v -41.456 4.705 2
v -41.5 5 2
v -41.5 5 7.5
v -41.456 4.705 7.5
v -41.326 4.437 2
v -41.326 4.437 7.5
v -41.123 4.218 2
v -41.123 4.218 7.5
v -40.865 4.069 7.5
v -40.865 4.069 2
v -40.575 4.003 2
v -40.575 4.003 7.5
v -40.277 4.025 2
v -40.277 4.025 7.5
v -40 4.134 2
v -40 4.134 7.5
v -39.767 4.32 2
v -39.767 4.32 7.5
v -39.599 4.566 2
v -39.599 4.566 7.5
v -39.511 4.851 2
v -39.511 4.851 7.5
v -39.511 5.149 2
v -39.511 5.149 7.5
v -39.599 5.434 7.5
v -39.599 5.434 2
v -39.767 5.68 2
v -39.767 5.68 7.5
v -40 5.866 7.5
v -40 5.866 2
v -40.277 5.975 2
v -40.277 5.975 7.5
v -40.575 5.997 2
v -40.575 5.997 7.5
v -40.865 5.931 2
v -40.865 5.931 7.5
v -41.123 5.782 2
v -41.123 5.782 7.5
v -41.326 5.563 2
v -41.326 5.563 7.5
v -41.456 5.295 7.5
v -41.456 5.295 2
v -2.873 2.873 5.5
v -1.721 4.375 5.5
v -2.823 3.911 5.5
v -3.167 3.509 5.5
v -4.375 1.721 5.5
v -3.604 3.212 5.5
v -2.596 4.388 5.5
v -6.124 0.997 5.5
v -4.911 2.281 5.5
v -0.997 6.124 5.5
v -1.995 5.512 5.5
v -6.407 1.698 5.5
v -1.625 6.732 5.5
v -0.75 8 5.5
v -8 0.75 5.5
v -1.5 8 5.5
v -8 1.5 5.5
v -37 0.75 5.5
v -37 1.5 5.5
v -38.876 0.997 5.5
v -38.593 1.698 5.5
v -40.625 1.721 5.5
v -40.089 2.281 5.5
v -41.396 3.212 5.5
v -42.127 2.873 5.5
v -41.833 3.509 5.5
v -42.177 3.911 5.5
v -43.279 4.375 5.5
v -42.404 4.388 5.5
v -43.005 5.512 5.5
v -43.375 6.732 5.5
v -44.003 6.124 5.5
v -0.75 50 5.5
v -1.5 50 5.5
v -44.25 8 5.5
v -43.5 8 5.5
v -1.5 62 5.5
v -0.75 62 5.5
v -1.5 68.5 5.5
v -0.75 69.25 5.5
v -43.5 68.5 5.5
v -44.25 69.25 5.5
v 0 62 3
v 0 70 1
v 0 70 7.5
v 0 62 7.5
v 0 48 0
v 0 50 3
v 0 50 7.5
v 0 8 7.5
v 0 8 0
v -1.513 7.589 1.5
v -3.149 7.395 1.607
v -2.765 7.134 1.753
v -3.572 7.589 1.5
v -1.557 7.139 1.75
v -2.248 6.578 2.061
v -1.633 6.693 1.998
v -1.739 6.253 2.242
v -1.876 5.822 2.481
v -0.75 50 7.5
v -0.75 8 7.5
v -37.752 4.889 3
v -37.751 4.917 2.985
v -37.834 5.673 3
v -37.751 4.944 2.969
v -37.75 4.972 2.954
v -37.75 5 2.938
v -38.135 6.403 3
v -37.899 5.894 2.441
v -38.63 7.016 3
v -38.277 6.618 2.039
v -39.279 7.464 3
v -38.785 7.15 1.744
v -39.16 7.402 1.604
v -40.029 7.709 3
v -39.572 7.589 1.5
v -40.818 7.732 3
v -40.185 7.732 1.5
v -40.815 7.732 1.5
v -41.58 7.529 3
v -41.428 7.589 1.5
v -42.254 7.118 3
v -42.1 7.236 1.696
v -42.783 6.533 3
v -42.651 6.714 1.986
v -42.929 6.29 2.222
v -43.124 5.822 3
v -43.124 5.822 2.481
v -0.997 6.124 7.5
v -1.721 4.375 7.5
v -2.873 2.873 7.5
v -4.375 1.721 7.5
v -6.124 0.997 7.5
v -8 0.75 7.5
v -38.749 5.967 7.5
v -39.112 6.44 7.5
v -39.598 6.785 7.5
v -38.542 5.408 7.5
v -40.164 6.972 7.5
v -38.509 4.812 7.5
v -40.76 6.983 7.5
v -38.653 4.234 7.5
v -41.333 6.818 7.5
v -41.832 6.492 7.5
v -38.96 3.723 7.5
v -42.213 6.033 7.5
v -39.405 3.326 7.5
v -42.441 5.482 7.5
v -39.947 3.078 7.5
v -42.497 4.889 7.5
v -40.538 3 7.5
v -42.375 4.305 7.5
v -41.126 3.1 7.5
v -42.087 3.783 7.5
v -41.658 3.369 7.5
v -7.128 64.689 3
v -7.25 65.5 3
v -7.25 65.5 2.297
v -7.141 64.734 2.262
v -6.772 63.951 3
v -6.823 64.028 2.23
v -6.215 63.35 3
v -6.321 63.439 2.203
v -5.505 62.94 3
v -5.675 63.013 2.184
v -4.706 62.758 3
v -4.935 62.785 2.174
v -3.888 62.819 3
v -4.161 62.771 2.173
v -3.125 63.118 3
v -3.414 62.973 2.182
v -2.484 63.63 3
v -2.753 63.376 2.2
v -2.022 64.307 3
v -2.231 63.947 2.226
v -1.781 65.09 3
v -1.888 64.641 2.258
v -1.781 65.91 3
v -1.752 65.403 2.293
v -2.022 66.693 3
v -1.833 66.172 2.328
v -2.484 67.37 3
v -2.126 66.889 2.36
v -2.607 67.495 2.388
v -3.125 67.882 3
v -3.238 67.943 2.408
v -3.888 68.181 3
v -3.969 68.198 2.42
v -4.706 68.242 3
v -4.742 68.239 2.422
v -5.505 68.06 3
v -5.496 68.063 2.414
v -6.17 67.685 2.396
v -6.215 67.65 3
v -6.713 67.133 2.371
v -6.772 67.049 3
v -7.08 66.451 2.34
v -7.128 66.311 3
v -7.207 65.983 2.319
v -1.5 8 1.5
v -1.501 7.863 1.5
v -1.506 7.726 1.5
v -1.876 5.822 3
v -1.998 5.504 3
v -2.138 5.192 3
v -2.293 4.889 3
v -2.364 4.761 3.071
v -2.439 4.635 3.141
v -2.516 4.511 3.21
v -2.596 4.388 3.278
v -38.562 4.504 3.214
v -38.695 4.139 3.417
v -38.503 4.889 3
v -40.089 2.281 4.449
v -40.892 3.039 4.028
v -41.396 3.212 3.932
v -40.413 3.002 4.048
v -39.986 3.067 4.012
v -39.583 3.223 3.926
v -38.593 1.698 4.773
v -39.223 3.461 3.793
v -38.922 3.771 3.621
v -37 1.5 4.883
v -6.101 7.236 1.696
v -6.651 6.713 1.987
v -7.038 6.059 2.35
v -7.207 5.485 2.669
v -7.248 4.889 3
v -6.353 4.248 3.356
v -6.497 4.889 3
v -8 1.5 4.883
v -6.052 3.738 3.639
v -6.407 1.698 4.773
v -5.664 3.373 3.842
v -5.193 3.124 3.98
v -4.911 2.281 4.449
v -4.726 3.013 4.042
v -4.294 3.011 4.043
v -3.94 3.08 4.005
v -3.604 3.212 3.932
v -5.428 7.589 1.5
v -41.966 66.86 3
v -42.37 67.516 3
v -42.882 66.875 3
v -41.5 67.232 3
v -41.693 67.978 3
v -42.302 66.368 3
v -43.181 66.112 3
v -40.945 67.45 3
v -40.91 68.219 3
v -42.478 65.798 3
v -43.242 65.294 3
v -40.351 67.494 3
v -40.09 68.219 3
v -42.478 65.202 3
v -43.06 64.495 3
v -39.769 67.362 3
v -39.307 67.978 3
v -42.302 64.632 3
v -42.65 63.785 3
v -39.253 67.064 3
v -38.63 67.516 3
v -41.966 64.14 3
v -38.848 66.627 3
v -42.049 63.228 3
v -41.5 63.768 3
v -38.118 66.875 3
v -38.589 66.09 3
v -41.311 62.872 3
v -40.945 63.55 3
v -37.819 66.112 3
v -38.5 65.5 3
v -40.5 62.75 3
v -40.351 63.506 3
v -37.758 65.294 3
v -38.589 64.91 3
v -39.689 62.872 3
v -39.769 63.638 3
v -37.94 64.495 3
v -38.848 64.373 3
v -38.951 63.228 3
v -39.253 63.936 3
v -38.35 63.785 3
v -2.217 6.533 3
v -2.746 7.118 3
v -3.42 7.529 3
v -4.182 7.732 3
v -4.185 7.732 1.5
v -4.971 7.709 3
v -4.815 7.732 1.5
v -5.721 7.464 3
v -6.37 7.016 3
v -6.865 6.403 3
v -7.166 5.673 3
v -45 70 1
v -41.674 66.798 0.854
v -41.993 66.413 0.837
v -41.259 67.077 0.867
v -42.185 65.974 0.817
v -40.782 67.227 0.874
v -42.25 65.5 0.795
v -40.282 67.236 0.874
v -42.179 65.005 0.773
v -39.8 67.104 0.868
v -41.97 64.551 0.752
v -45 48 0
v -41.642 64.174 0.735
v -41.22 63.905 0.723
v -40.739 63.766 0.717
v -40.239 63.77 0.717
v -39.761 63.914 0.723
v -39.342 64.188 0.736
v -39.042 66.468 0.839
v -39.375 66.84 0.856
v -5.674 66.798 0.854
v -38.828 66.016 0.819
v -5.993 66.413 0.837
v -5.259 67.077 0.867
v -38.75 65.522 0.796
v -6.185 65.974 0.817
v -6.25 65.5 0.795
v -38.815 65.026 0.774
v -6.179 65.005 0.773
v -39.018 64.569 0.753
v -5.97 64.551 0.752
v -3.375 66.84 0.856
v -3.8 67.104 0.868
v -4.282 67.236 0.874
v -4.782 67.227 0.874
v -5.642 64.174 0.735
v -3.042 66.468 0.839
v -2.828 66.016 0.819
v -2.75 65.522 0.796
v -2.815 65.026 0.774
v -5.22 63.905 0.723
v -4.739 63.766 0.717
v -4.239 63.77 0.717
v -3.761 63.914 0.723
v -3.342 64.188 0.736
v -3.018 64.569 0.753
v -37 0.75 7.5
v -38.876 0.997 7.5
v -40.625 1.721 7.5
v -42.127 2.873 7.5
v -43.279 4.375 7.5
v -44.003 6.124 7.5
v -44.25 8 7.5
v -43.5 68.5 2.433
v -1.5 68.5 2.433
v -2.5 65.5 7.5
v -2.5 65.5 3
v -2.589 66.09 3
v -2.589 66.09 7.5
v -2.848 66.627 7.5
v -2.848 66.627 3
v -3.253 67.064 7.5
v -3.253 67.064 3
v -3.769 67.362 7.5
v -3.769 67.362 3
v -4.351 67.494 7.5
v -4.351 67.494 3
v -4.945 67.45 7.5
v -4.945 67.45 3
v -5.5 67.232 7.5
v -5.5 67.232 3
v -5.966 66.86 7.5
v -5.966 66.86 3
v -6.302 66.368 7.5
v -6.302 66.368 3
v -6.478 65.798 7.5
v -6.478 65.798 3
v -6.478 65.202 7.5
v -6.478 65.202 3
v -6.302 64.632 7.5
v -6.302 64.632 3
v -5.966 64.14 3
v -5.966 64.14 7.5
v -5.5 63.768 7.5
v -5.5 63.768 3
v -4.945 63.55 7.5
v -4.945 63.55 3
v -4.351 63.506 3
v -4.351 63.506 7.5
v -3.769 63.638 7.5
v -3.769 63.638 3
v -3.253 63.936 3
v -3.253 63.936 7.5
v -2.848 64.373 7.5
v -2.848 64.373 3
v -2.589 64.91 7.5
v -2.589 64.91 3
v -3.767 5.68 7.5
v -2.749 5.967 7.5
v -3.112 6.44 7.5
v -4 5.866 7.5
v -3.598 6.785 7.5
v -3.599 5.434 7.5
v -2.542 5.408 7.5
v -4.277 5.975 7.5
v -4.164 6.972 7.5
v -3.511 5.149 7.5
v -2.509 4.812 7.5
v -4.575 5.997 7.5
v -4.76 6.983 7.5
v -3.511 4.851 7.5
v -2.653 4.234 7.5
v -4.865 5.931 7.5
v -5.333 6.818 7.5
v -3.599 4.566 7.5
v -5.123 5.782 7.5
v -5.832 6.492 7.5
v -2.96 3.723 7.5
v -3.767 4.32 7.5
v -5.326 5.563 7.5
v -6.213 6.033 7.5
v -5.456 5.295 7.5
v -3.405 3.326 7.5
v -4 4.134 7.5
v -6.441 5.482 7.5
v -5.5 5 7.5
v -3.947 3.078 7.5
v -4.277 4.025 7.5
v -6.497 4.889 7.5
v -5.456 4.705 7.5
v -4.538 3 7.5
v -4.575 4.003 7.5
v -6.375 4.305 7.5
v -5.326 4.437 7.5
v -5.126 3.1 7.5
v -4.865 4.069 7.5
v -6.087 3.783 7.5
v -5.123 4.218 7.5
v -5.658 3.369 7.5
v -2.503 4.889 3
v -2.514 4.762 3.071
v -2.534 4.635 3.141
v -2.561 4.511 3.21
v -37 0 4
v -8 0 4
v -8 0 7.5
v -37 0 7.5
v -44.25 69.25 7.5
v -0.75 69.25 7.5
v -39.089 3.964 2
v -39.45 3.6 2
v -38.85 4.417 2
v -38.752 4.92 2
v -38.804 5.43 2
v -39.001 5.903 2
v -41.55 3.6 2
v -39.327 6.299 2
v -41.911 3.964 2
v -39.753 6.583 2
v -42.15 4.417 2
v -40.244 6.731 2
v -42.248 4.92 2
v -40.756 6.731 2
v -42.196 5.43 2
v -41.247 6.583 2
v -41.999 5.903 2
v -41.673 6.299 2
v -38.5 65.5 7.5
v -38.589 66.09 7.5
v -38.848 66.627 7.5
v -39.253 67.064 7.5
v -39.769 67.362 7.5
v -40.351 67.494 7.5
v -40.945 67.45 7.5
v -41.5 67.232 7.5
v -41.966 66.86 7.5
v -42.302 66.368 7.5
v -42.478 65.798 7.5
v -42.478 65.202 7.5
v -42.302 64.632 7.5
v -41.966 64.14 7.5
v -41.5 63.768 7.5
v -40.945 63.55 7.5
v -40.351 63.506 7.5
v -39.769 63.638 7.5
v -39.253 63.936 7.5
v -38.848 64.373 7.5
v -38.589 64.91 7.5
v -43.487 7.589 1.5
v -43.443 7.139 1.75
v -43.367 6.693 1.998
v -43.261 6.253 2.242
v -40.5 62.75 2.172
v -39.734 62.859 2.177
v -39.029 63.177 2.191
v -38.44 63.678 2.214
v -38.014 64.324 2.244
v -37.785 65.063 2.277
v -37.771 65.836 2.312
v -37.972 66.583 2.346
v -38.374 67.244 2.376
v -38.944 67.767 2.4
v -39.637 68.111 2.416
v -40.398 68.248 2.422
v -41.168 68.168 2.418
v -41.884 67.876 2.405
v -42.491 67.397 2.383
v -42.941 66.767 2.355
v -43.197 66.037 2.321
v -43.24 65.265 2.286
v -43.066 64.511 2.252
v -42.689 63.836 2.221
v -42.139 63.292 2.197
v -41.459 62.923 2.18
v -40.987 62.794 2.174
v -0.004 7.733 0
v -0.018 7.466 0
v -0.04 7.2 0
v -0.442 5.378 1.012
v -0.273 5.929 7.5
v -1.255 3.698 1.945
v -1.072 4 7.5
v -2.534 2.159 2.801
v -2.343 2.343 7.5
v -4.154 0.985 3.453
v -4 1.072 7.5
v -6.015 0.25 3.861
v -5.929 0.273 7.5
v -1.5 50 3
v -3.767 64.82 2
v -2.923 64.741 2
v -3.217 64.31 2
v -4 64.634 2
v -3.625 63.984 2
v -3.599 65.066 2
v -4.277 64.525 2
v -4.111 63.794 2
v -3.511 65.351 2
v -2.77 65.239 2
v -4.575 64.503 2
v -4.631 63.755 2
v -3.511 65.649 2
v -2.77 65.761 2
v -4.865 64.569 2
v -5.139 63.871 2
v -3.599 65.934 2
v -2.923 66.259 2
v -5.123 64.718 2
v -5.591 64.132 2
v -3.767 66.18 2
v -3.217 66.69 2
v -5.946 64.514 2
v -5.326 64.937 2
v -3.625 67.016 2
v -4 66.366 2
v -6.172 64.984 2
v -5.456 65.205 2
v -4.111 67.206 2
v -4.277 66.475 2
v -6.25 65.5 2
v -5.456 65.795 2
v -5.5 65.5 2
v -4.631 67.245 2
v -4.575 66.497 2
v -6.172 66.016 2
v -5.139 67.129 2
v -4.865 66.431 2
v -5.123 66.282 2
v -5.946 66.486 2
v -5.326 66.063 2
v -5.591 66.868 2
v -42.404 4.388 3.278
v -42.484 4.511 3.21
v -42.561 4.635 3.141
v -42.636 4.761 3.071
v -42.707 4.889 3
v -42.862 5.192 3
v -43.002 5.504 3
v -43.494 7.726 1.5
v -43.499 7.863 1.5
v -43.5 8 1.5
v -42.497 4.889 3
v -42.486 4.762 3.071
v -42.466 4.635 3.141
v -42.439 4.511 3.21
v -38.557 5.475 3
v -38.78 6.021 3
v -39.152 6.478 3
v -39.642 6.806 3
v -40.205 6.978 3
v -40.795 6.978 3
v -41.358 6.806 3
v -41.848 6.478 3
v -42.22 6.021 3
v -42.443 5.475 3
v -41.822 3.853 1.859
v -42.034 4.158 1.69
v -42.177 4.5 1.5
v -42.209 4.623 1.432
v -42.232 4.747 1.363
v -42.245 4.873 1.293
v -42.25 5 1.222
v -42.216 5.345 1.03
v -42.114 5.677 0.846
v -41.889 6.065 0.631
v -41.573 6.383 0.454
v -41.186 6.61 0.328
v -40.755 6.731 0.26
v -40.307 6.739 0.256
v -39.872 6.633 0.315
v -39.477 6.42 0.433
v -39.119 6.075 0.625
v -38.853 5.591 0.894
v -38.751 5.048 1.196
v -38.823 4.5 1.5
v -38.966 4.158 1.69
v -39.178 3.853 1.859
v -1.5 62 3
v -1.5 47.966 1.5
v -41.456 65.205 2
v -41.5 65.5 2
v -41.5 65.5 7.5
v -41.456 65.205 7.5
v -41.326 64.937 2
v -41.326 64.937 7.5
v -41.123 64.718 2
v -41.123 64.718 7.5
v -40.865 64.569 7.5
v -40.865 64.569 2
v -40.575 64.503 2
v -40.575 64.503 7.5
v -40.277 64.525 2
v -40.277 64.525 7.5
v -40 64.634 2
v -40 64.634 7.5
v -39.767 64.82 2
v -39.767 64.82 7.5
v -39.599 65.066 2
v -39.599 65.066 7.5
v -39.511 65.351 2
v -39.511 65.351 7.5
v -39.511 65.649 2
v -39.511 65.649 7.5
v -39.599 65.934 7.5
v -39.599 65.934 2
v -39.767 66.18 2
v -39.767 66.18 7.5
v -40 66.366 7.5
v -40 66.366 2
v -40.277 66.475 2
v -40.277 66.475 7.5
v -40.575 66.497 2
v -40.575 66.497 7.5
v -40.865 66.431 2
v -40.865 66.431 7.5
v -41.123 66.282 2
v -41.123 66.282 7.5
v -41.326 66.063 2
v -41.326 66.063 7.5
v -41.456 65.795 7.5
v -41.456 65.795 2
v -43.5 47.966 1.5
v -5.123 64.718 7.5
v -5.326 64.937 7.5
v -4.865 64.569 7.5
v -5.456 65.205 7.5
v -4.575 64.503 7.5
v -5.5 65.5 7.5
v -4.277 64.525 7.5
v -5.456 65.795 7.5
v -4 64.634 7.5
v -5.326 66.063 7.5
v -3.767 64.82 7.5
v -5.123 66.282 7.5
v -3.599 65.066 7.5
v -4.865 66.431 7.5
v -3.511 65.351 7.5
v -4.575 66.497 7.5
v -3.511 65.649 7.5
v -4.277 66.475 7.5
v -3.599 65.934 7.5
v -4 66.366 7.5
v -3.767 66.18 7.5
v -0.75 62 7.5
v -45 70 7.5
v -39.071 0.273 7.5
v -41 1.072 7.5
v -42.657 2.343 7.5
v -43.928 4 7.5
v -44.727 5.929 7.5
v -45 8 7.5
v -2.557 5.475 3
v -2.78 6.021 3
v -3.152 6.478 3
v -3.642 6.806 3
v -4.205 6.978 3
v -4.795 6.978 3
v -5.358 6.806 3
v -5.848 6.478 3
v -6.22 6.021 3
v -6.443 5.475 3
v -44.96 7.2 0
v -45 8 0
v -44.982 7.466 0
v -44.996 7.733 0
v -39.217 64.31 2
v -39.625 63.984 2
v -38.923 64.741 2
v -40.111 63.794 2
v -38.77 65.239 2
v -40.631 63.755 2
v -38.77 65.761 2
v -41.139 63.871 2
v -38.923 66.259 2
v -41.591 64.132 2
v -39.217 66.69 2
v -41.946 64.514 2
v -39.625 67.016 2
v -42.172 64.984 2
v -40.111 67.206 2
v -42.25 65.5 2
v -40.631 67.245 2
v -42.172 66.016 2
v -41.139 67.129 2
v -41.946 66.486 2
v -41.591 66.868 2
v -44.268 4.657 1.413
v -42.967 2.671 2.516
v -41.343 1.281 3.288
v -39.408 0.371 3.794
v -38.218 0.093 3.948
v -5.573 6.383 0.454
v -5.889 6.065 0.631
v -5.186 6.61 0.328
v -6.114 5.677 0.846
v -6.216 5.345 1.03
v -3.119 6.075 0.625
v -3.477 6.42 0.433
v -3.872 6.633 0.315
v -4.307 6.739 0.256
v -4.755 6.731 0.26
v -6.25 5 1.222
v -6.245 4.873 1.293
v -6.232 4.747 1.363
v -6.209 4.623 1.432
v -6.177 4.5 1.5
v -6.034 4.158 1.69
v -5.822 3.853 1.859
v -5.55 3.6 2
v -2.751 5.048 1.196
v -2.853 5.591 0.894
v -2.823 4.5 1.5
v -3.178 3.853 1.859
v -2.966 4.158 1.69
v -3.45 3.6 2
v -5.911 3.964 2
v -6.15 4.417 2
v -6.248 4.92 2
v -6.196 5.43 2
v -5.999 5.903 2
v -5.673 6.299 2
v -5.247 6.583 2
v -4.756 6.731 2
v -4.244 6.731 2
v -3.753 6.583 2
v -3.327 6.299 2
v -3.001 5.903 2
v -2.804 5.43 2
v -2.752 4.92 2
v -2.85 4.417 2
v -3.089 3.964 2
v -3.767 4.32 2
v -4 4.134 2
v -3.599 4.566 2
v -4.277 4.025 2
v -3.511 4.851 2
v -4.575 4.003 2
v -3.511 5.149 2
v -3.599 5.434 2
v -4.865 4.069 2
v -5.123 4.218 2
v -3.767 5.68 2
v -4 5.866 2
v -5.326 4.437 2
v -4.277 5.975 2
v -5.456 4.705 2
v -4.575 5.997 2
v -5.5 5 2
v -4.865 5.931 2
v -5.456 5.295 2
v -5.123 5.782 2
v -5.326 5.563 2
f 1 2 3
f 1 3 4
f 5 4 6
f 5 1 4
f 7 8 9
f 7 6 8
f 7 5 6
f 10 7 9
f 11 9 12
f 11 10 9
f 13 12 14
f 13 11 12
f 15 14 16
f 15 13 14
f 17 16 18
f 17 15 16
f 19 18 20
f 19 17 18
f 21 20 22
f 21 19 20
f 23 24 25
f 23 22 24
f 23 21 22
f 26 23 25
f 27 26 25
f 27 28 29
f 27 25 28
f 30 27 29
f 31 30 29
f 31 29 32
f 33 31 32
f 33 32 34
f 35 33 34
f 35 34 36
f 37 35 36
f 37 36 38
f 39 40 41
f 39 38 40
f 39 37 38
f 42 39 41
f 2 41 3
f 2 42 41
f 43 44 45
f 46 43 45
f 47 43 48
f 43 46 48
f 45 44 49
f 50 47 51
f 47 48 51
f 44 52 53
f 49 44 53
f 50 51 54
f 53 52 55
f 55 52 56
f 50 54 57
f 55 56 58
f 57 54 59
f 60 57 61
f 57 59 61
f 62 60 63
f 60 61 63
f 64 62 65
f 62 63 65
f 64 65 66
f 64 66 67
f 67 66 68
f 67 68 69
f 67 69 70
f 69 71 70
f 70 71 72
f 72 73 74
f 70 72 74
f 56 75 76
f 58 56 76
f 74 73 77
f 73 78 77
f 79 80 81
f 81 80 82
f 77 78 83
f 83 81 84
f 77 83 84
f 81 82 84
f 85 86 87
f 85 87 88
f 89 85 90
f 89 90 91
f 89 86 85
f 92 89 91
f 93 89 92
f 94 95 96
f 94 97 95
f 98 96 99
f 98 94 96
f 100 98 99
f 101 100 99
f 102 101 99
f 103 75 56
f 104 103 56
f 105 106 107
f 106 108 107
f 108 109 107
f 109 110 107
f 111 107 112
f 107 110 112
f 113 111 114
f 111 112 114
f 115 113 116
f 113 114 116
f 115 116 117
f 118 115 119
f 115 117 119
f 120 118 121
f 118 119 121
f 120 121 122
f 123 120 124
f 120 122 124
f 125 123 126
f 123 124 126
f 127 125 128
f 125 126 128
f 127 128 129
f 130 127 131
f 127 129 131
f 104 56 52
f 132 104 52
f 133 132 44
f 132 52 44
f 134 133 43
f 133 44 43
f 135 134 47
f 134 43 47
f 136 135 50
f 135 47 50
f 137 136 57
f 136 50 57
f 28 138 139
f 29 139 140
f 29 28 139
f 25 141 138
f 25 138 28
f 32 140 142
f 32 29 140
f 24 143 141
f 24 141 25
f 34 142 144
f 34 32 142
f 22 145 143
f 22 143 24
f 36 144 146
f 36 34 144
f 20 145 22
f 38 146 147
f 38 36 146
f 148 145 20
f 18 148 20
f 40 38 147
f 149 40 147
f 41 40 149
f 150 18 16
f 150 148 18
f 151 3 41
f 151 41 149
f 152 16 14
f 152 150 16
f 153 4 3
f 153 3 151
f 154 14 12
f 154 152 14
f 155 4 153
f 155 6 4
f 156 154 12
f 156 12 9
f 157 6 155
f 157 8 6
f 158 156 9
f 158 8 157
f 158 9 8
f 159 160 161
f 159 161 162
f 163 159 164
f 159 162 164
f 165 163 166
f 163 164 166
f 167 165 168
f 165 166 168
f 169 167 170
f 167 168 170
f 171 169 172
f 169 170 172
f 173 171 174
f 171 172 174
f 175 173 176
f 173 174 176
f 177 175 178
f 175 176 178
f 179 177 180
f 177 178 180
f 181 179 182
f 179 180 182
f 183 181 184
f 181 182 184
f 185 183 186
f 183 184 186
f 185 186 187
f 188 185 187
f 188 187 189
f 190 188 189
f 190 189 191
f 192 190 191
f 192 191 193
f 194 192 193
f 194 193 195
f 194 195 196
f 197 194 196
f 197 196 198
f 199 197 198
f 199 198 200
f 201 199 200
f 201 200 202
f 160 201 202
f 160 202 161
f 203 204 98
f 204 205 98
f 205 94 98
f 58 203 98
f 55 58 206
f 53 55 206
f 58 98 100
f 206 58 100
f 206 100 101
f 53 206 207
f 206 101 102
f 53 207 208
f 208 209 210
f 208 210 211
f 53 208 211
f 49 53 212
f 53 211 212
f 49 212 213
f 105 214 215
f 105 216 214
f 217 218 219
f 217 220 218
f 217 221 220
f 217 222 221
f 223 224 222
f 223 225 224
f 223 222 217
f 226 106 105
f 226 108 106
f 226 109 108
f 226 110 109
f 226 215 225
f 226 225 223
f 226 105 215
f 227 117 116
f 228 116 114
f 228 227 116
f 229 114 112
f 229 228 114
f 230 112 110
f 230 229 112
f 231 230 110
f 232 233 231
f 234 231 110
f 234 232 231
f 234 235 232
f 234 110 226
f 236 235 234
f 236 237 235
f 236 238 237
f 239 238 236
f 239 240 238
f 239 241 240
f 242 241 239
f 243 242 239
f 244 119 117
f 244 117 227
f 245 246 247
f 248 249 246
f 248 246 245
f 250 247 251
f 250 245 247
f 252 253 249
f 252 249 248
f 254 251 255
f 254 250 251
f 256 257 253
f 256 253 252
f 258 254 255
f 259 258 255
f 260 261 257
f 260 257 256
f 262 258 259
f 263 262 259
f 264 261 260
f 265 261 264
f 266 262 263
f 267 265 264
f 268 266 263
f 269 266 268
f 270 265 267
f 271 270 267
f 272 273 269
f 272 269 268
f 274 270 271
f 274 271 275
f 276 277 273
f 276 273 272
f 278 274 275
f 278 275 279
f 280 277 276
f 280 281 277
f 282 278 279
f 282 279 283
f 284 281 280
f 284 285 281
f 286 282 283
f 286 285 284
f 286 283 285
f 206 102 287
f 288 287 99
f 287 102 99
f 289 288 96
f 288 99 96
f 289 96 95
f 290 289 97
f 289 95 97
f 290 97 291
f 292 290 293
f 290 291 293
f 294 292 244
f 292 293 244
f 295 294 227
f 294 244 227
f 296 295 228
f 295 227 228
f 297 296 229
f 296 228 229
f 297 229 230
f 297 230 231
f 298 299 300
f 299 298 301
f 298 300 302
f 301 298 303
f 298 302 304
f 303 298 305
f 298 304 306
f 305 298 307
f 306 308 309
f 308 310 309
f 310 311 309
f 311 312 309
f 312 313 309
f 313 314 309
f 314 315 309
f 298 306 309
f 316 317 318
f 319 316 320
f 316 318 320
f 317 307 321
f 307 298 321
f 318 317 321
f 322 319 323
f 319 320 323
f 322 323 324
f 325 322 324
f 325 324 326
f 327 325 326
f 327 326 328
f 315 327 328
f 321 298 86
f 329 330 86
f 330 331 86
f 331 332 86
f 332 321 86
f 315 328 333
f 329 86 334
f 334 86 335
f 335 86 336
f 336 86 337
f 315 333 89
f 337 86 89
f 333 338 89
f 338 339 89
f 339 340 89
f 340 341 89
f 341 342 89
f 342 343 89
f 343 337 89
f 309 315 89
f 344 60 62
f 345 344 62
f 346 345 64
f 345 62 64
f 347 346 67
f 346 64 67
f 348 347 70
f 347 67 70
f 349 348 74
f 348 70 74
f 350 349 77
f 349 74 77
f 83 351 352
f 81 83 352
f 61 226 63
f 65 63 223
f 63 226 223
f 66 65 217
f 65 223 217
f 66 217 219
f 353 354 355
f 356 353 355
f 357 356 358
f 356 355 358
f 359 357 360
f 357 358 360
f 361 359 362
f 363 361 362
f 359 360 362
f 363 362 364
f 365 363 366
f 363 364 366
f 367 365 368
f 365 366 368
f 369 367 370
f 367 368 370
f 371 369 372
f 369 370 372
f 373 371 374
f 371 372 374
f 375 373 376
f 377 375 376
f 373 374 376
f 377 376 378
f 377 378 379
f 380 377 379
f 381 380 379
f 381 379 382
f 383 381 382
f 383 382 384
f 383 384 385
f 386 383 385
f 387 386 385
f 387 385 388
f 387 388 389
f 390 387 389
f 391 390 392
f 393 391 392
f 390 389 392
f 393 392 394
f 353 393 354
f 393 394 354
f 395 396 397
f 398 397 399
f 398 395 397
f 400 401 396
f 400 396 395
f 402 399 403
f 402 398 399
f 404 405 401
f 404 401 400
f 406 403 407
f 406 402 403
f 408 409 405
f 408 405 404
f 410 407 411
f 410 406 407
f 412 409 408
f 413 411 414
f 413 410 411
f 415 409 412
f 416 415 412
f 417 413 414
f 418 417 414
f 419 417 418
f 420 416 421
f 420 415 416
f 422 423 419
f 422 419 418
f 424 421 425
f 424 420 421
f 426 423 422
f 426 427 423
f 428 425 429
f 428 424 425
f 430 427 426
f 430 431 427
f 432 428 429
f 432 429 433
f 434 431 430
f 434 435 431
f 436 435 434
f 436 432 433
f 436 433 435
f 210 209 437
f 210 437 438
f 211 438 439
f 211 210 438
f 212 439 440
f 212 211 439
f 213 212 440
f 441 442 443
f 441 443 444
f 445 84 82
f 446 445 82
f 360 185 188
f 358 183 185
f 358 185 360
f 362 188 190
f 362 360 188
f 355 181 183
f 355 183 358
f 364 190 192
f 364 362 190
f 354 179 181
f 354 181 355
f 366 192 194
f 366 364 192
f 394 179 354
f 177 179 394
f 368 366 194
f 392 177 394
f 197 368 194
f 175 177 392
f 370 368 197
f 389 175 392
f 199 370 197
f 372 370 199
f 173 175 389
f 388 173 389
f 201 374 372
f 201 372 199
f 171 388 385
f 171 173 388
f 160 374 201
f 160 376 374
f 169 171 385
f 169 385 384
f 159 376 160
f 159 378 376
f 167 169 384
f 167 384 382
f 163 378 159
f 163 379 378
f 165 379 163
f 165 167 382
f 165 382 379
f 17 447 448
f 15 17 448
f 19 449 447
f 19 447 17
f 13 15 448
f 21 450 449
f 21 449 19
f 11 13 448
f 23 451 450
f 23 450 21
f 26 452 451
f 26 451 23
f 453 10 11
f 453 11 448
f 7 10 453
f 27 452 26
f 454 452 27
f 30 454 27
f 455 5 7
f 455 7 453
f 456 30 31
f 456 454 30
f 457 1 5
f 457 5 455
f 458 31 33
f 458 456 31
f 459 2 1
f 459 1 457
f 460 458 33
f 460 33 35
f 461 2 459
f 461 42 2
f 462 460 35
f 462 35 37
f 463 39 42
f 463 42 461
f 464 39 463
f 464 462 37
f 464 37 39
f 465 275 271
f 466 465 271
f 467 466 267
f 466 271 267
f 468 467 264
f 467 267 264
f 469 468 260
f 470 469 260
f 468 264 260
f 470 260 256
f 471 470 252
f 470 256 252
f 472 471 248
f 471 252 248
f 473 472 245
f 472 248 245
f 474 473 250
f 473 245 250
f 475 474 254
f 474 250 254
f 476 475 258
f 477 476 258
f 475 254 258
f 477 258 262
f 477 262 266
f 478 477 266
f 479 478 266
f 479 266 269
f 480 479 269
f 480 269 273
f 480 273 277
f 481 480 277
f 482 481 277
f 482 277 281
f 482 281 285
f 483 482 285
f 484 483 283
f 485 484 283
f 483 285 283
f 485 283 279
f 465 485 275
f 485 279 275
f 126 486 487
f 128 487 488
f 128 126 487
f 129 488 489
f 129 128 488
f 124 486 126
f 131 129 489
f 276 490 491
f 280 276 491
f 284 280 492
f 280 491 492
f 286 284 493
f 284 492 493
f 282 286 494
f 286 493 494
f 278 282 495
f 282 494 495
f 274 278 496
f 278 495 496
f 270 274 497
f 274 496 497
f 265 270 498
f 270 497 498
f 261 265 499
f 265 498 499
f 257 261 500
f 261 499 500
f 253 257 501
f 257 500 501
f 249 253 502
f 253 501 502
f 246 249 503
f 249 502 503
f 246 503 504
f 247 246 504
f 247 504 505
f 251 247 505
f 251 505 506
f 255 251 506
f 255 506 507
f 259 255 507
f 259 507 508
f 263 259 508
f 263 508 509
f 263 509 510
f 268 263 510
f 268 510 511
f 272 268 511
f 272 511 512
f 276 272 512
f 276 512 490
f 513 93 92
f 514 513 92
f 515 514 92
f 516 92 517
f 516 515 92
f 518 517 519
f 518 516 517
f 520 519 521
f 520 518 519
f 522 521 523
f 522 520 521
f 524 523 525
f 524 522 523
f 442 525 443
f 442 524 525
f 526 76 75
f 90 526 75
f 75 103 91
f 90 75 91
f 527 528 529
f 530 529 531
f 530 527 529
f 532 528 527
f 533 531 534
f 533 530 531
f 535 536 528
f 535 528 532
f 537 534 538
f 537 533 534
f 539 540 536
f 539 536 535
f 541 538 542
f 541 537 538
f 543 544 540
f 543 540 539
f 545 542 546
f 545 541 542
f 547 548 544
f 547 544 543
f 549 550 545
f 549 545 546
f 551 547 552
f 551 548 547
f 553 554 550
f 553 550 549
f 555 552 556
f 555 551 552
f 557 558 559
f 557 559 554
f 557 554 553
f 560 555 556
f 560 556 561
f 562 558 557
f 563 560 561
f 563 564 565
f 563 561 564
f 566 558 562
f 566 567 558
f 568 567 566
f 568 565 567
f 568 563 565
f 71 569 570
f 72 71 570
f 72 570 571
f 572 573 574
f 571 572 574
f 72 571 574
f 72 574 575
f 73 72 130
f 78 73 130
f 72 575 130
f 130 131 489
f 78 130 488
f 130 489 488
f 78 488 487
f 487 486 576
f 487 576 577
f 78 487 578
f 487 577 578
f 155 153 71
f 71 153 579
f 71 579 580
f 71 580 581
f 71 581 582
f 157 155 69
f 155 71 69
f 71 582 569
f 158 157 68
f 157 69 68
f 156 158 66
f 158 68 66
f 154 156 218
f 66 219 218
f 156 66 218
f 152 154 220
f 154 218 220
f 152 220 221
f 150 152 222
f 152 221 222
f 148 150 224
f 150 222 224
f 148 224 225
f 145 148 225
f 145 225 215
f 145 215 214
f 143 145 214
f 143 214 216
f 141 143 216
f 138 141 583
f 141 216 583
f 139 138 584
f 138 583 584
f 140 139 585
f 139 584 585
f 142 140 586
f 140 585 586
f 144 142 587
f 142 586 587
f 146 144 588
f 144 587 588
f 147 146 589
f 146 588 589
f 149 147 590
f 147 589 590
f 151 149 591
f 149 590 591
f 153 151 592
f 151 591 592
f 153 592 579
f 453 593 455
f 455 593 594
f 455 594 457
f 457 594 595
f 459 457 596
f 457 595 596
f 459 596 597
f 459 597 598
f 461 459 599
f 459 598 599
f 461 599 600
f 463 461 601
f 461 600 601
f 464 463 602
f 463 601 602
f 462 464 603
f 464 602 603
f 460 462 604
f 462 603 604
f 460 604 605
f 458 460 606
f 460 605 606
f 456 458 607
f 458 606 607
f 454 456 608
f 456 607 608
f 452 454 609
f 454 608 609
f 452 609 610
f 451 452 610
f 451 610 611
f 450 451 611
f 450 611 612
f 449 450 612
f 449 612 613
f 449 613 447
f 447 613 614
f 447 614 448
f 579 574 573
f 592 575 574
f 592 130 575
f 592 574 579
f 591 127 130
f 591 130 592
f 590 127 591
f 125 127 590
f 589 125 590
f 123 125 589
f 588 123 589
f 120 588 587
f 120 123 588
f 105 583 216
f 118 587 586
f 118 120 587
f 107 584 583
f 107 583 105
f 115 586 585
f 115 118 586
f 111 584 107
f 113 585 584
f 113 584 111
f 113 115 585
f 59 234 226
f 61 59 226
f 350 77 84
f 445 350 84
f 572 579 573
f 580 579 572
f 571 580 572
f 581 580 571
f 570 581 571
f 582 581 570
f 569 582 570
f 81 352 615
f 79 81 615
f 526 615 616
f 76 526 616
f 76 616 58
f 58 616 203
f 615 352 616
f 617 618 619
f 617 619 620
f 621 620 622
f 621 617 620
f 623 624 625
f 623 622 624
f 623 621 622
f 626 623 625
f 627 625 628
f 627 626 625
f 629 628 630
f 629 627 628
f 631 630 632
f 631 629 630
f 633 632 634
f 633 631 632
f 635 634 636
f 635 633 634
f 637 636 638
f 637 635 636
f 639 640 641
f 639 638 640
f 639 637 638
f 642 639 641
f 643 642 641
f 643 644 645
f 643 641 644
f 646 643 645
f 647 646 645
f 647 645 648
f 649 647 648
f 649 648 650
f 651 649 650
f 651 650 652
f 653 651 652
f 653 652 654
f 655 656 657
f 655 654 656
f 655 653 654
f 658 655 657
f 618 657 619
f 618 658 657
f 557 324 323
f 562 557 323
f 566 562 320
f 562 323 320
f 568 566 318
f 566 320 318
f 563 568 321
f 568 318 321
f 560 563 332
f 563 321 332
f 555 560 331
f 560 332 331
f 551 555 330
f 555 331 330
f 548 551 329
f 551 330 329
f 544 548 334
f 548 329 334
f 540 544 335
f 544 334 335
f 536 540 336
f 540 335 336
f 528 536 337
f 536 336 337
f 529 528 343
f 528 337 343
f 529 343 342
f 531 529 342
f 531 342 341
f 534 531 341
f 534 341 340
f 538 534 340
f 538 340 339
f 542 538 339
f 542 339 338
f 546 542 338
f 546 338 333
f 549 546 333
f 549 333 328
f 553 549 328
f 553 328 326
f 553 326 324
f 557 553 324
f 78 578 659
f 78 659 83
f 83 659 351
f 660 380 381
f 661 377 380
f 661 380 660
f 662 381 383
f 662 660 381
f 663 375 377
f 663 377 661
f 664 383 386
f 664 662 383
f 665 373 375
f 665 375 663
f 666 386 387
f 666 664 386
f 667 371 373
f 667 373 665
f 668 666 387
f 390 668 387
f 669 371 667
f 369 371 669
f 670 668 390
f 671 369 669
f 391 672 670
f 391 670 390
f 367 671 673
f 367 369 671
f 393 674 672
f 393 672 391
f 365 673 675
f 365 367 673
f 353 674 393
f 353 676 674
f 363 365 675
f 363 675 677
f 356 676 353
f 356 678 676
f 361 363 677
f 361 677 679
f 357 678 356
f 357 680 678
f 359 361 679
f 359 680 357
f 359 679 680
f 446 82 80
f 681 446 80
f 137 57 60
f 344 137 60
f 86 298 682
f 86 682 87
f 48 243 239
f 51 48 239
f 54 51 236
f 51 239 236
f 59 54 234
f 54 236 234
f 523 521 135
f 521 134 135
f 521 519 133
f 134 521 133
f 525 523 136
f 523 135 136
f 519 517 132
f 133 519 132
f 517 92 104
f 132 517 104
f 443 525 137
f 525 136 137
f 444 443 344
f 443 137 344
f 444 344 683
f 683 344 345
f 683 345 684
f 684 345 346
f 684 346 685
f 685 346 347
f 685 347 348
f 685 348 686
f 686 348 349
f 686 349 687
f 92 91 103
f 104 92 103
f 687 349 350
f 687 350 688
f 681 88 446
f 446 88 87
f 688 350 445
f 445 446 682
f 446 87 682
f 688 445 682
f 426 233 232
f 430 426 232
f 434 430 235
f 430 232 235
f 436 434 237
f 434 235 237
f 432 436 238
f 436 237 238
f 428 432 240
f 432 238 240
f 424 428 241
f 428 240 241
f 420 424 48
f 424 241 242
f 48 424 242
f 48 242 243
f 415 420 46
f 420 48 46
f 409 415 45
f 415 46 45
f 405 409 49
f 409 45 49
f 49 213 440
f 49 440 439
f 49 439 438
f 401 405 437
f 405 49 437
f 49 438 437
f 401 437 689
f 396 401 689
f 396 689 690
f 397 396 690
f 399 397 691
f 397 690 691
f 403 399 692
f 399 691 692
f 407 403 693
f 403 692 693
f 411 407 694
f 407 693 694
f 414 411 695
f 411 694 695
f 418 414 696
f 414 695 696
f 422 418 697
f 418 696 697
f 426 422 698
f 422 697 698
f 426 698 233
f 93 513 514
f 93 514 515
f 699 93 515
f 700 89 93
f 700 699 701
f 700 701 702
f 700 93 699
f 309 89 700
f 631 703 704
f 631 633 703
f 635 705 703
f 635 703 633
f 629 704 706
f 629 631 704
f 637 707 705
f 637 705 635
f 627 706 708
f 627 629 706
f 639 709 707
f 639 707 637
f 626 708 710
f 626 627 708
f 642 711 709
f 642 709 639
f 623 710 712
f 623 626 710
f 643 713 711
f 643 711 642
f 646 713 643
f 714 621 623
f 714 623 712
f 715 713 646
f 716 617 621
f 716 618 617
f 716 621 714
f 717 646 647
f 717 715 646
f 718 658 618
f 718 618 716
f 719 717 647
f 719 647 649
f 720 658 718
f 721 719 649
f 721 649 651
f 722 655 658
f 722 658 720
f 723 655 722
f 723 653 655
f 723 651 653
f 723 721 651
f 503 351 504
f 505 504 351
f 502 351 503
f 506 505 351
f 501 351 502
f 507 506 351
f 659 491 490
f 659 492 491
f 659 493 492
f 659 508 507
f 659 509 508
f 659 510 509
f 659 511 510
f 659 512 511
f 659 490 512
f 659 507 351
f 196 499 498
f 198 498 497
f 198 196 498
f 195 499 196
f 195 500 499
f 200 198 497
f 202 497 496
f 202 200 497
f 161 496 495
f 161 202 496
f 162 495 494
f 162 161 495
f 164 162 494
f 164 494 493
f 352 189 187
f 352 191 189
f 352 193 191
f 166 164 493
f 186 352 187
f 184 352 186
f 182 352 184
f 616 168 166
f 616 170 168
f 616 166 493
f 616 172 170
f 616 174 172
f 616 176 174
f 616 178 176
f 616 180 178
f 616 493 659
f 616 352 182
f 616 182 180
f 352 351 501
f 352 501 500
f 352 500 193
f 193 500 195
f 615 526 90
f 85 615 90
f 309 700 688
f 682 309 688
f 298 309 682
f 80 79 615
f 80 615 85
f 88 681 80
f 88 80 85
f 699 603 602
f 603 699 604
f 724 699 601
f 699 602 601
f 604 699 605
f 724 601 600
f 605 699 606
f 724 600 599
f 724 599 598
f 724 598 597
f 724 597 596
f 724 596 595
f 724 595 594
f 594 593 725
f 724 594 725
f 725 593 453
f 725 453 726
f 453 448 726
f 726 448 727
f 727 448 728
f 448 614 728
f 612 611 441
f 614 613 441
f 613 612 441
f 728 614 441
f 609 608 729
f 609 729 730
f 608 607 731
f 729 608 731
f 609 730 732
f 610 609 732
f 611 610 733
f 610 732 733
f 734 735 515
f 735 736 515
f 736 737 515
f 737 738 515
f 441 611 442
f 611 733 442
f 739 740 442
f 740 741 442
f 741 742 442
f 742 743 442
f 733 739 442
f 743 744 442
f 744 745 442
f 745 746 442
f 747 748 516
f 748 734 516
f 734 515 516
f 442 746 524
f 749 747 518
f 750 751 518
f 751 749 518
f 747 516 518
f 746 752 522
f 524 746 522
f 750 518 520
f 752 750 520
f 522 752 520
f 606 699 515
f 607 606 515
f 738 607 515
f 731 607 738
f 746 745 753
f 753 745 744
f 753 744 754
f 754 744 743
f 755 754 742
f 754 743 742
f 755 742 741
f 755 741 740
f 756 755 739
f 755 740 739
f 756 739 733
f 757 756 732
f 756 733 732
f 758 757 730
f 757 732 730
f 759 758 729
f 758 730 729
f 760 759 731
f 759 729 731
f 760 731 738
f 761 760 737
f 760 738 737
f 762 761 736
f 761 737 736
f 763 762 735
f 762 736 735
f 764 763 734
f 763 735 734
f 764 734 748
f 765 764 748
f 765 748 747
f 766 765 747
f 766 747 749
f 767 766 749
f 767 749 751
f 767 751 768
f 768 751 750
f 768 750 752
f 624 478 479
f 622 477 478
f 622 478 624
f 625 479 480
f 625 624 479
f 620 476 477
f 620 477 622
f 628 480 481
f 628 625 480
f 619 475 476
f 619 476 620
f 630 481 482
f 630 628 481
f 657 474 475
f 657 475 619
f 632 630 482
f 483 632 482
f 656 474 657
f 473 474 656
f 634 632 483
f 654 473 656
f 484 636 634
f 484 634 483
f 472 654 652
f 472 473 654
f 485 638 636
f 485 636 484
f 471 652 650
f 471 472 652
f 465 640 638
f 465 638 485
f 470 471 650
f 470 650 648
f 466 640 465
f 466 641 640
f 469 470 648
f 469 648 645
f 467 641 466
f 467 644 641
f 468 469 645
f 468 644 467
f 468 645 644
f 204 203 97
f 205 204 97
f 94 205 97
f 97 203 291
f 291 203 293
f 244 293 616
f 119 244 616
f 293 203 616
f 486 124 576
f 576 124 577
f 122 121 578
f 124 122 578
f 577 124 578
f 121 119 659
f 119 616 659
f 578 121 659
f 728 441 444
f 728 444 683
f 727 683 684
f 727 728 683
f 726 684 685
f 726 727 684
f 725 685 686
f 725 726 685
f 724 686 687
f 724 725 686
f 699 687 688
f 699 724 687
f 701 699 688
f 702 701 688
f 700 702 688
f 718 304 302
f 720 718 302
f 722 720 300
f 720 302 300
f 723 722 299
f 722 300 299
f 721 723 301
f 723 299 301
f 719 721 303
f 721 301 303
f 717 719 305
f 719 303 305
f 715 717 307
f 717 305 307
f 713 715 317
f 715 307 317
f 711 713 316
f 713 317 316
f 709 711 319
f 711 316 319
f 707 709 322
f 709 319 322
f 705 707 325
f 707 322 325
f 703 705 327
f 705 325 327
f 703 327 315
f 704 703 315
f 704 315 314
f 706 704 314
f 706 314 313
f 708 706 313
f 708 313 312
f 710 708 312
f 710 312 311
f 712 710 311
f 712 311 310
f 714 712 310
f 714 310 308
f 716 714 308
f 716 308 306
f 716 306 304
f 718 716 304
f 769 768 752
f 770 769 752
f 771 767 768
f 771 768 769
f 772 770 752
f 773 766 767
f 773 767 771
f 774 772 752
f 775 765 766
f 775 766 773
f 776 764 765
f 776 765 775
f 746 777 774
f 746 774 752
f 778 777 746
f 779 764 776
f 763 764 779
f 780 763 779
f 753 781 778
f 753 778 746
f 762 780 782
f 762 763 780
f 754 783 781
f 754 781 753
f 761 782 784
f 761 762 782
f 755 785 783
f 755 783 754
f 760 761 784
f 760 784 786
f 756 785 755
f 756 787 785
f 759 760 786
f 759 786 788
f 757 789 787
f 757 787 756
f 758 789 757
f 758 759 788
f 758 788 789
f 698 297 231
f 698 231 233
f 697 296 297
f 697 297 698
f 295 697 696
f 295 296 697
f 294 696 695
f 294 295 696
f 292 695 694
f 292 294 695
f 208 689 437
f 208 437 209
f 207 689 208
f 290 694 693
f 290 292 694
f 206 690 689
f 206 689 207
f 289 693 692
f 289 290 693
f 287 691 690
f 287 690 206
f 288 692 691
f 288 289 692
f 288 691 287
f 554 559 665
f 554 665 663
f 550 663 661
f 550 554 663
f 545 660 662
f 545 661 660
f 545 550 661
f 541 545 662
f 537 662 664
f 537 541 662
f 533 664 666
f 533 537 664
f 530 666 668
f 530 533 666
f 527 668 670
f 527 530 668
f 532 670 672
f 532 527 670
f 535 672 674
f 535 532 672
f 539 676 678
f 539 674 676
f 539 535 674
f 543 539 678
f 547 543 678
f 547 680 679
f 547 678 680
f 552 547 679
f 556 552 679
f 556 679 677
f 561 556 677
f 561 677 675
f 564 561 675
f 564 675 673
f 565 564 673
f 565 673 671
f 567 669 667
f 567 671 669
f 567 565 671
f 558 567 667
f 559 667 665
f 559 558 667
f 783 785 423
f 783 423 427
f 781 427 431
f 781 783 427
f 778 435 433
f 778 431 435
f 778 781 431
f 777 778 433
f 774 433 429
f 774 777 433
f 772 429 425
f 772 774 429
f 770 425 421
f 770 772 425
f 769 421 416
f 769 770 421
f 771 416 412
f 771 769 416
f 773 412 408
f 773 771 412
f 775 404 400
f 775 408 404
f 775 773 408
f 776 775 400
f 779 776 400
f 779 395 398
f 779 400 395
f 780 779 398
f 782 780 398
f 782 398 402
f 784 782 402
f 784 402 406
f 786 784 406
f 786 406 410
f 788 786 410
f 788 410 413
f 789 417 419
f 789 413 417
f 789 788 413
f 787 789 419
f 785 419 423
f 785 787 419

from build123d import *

# Parameters (mm, degrees)
EXTRUDE_1_DEPTH     = 7.5
CUT_EXTRUDE_1_DEPTH = 84.553874835
SHELL_1_T           = -1.5
CUT_EXTRUDE_START   = -2
CUT_EXTRUDE_2_DEPTH = 2
SKETCH_4_R          = 2.75
EXTRUDE_2_DEPTH     = 1.5
SKETCH_5_R          = 2
EXTRUDE_3_DEPTH     = 4.5
SKETCH_6_R          = 1.75
CUT_EXTRUDE_3_DEPTH = 2
SKETCH_9_R          = 1
CUT_EXTRUDE_4_DEPTH = 84.553874835
CUT_EXTRUDE_5_DEPTH = 84.553874835
SKETCH_12_W         = 1.5
SKETCH_12_H         = 12
CUT_EXTRUDE_6_DEPTH = 4.5


with BuildPart() as part:
    # 草图1 → 凸台-拉伸1 (new body)
    with BuildSketch(Plane.XY):
        with BuildLine():
            Line((-45, 70), (0, 70))
            Line((0, 70), (0, 8))
            ThreePointArc((0, 8), (-2.343145751, 2.343145751), (-8, 0))
            Line((-8, 0), (-37, 0))
            ThreePointArc((-37, 0), (-42.656854249, 2.343145751), (-45, 8))
            Line((-45, 8), (-45, 70))
        make_face()
    extrude(amount=EXTRUDE_1_DEPTH)

    # 草图2 → 切除-拉伸1 (cut, through all)
    with BuildSketch(Plane(origin=(0, 0, 0), x_dir=(0, 0, -1), z_dir=(1, 0, 0))):
        Polygon((0, 0), (0, 7.2), (-4, 0), align=None)
        Polygon((0, 70), (-1, 70), (0, 48), align=None)
    extrude(amount=-CUT_EXTRUDE_1_DEPTH, mode=Mode.SUBTRACT)

    # 抽壳1
    shell_1_openings = [part.faces().sort_by_distance(p)[0] for p in [
        (-22.5, 35.292176643, 7.5),
    ]]
    offset(amount=SHELL_1_T, openings=shell_1_openings, kind=Kind.INTERSECTION)

    # 草图3 → 切除-拉伸2 (cut)
    with BuildSketch(Plane.XY.offset(7.5).offset(CUT_EXTRUDE_START)):
        with BuildLine():
            Line((-44.25, 69.25), (-0.75, 69.25))
            Line((-0.75, 69.25), (-0.75, 8))
            ThreePointArc((-0.75, 8), (-2.873475836, 2.873475836), (-8, 0.75))
            Line((-8, 0.75), (-37, 0.75))
            ThreePointArc((-37, 0.75), (-42.126524164, 2.873475836), (-44.25, 8))
            Line((-44.25, 8), (-44.25, 69.25))
        make_face()
        with BuildLine():
            Line((-43.5, 68.5), (-1.5, 68.5))
            Line((-1.5, 68.5), (-1.5, 8))
            ThreePointArc((-1.5, 8), (-3.403805922, 3.403805922), (-8, 1.5))
            Line((-8, 1.5), (-37, 1.5))
            ThreePointArc((-37, 1.5), (-41.596194078, 3.403805922), (-43.5, 8))
            Line((-43.5, 8), (-43.5, 68.5))
        make_face(mode=Mode.SUBTRACT)
    extrude(amount=CUT_EXTRUDE_2_DEPTH, mode=Mode.SUBTRACT)

    # 草图4 → 凸台-拉伸2 (add)
    with BuildSketch(Plane.XY.offset(1.5)):
        with Locations(Location((-40.5, 65.5, 0), (0, 0, 270))):
            Circle(SKETCH_4_R)
        with Locations((-40.5, 5)):
            Circle(SKETCH_4_R)
        with Locations((-4.5, 5)):
            Circle(SKETCH_4_R)
        with Locations(Location((-4.5, 65.5, 0), (0, 0, 180))):
            Circle(SKETCH_4_R)
    extrude(amount=EXTRUDE_2_DEPTH)

    # 草图5 → 凸台-拉伸3 (add)
    with BuildSketch(Plane.XY.offset(3)):
        with Locations((-40.5, 65.5)):
            Circle(SKETCH_5_R)
        with Locations((-4.5, 65.5)):
            Circle(SKETCH_5_R)
        with Locations(Location((-40.5, 5, 0), (0, 0, 183.190472592))):
            Circle(SKETCH_5_R)
        with Locations(Location((-4.5, 5, 0), (0, 0, 183.190472592))):
            Circle(SKETCH_5_R)
    extrude(amount=EXTRUDE_3_DEPTH)

    # 草图6 → 切除-拉伸3 (cut)
    with BuildSketch(Plane(origin=(0, 0, 0), x_dir=(-1, 0, 0), z_dir=(0, 0, -1))):
        with Locations((4.5, 65.5)):
            Circle(SKETCH_6_R)
        with Locations((40.5, 65.5)):
            Circle(SKETCH_6_R)
        with Locations((40.5, 5)):
            Circle(SKETCH_6_R)
        with Locations((4.5, 5)):
            Circle(SKETCH_6_R)
    extrude(amount=-CUT_EXTRUDE_3_DEPTH, mode=Mode.SUBTRACT)

    # 草图9 → 切除-拉伸4 (cut, through all)
    with BuildSketch(Plane.XY):
        with Locations(Location((-40.5, 65.5, 0), (0, 0, 180))):
            Circle(SKETCH_9_R)
        with Locations(Location((-4.5, 65.5, 0), (0, 0, 180))):
            Circle(SKETCH_9_R)
        with Locations(Location((-4.5, 5, 0), (0, 0, 180))):
            Circle(SKETCH_9_R)
        with Locations(Location((-40.5, 5, 0), (0, 0, 180))):
            Circle(SKETCH_9_R)
    extrude(amount=CUT_EXTRUDE_4_DEPTH, mode=Mode.SUBTRACT)

    # 草图11 → 切除-拉伸5 (cut, through all)
    with BuildSketch(Plane(origin=(0, 0, 0), x_dir=(0, 0, -1), z_dir=(1, 0, 0))):
        Polygon((0, 0), (0, 7.2), (-4, 0), align=None)
        Polygon((0, 70), (-1, 70), (0, 48), align=None)
    extrude(amount=-CUT_EXTRUDE_5_DEPTH, mode=Mode.SUBTRACT)

    # 草图12 → 切除-拉伸6 (cut)
    with BuildSketch(Plane.XY.offset(7.5)):
        with Locations((-0.75, 56)):
            Rectangle(SKETCH_12_W, SKETCH_12_H)
    extrude(amount=-CUT_EXTRUDE_6_DEPTH, mode=Mode.SUBTRACT)


solid = part.part
